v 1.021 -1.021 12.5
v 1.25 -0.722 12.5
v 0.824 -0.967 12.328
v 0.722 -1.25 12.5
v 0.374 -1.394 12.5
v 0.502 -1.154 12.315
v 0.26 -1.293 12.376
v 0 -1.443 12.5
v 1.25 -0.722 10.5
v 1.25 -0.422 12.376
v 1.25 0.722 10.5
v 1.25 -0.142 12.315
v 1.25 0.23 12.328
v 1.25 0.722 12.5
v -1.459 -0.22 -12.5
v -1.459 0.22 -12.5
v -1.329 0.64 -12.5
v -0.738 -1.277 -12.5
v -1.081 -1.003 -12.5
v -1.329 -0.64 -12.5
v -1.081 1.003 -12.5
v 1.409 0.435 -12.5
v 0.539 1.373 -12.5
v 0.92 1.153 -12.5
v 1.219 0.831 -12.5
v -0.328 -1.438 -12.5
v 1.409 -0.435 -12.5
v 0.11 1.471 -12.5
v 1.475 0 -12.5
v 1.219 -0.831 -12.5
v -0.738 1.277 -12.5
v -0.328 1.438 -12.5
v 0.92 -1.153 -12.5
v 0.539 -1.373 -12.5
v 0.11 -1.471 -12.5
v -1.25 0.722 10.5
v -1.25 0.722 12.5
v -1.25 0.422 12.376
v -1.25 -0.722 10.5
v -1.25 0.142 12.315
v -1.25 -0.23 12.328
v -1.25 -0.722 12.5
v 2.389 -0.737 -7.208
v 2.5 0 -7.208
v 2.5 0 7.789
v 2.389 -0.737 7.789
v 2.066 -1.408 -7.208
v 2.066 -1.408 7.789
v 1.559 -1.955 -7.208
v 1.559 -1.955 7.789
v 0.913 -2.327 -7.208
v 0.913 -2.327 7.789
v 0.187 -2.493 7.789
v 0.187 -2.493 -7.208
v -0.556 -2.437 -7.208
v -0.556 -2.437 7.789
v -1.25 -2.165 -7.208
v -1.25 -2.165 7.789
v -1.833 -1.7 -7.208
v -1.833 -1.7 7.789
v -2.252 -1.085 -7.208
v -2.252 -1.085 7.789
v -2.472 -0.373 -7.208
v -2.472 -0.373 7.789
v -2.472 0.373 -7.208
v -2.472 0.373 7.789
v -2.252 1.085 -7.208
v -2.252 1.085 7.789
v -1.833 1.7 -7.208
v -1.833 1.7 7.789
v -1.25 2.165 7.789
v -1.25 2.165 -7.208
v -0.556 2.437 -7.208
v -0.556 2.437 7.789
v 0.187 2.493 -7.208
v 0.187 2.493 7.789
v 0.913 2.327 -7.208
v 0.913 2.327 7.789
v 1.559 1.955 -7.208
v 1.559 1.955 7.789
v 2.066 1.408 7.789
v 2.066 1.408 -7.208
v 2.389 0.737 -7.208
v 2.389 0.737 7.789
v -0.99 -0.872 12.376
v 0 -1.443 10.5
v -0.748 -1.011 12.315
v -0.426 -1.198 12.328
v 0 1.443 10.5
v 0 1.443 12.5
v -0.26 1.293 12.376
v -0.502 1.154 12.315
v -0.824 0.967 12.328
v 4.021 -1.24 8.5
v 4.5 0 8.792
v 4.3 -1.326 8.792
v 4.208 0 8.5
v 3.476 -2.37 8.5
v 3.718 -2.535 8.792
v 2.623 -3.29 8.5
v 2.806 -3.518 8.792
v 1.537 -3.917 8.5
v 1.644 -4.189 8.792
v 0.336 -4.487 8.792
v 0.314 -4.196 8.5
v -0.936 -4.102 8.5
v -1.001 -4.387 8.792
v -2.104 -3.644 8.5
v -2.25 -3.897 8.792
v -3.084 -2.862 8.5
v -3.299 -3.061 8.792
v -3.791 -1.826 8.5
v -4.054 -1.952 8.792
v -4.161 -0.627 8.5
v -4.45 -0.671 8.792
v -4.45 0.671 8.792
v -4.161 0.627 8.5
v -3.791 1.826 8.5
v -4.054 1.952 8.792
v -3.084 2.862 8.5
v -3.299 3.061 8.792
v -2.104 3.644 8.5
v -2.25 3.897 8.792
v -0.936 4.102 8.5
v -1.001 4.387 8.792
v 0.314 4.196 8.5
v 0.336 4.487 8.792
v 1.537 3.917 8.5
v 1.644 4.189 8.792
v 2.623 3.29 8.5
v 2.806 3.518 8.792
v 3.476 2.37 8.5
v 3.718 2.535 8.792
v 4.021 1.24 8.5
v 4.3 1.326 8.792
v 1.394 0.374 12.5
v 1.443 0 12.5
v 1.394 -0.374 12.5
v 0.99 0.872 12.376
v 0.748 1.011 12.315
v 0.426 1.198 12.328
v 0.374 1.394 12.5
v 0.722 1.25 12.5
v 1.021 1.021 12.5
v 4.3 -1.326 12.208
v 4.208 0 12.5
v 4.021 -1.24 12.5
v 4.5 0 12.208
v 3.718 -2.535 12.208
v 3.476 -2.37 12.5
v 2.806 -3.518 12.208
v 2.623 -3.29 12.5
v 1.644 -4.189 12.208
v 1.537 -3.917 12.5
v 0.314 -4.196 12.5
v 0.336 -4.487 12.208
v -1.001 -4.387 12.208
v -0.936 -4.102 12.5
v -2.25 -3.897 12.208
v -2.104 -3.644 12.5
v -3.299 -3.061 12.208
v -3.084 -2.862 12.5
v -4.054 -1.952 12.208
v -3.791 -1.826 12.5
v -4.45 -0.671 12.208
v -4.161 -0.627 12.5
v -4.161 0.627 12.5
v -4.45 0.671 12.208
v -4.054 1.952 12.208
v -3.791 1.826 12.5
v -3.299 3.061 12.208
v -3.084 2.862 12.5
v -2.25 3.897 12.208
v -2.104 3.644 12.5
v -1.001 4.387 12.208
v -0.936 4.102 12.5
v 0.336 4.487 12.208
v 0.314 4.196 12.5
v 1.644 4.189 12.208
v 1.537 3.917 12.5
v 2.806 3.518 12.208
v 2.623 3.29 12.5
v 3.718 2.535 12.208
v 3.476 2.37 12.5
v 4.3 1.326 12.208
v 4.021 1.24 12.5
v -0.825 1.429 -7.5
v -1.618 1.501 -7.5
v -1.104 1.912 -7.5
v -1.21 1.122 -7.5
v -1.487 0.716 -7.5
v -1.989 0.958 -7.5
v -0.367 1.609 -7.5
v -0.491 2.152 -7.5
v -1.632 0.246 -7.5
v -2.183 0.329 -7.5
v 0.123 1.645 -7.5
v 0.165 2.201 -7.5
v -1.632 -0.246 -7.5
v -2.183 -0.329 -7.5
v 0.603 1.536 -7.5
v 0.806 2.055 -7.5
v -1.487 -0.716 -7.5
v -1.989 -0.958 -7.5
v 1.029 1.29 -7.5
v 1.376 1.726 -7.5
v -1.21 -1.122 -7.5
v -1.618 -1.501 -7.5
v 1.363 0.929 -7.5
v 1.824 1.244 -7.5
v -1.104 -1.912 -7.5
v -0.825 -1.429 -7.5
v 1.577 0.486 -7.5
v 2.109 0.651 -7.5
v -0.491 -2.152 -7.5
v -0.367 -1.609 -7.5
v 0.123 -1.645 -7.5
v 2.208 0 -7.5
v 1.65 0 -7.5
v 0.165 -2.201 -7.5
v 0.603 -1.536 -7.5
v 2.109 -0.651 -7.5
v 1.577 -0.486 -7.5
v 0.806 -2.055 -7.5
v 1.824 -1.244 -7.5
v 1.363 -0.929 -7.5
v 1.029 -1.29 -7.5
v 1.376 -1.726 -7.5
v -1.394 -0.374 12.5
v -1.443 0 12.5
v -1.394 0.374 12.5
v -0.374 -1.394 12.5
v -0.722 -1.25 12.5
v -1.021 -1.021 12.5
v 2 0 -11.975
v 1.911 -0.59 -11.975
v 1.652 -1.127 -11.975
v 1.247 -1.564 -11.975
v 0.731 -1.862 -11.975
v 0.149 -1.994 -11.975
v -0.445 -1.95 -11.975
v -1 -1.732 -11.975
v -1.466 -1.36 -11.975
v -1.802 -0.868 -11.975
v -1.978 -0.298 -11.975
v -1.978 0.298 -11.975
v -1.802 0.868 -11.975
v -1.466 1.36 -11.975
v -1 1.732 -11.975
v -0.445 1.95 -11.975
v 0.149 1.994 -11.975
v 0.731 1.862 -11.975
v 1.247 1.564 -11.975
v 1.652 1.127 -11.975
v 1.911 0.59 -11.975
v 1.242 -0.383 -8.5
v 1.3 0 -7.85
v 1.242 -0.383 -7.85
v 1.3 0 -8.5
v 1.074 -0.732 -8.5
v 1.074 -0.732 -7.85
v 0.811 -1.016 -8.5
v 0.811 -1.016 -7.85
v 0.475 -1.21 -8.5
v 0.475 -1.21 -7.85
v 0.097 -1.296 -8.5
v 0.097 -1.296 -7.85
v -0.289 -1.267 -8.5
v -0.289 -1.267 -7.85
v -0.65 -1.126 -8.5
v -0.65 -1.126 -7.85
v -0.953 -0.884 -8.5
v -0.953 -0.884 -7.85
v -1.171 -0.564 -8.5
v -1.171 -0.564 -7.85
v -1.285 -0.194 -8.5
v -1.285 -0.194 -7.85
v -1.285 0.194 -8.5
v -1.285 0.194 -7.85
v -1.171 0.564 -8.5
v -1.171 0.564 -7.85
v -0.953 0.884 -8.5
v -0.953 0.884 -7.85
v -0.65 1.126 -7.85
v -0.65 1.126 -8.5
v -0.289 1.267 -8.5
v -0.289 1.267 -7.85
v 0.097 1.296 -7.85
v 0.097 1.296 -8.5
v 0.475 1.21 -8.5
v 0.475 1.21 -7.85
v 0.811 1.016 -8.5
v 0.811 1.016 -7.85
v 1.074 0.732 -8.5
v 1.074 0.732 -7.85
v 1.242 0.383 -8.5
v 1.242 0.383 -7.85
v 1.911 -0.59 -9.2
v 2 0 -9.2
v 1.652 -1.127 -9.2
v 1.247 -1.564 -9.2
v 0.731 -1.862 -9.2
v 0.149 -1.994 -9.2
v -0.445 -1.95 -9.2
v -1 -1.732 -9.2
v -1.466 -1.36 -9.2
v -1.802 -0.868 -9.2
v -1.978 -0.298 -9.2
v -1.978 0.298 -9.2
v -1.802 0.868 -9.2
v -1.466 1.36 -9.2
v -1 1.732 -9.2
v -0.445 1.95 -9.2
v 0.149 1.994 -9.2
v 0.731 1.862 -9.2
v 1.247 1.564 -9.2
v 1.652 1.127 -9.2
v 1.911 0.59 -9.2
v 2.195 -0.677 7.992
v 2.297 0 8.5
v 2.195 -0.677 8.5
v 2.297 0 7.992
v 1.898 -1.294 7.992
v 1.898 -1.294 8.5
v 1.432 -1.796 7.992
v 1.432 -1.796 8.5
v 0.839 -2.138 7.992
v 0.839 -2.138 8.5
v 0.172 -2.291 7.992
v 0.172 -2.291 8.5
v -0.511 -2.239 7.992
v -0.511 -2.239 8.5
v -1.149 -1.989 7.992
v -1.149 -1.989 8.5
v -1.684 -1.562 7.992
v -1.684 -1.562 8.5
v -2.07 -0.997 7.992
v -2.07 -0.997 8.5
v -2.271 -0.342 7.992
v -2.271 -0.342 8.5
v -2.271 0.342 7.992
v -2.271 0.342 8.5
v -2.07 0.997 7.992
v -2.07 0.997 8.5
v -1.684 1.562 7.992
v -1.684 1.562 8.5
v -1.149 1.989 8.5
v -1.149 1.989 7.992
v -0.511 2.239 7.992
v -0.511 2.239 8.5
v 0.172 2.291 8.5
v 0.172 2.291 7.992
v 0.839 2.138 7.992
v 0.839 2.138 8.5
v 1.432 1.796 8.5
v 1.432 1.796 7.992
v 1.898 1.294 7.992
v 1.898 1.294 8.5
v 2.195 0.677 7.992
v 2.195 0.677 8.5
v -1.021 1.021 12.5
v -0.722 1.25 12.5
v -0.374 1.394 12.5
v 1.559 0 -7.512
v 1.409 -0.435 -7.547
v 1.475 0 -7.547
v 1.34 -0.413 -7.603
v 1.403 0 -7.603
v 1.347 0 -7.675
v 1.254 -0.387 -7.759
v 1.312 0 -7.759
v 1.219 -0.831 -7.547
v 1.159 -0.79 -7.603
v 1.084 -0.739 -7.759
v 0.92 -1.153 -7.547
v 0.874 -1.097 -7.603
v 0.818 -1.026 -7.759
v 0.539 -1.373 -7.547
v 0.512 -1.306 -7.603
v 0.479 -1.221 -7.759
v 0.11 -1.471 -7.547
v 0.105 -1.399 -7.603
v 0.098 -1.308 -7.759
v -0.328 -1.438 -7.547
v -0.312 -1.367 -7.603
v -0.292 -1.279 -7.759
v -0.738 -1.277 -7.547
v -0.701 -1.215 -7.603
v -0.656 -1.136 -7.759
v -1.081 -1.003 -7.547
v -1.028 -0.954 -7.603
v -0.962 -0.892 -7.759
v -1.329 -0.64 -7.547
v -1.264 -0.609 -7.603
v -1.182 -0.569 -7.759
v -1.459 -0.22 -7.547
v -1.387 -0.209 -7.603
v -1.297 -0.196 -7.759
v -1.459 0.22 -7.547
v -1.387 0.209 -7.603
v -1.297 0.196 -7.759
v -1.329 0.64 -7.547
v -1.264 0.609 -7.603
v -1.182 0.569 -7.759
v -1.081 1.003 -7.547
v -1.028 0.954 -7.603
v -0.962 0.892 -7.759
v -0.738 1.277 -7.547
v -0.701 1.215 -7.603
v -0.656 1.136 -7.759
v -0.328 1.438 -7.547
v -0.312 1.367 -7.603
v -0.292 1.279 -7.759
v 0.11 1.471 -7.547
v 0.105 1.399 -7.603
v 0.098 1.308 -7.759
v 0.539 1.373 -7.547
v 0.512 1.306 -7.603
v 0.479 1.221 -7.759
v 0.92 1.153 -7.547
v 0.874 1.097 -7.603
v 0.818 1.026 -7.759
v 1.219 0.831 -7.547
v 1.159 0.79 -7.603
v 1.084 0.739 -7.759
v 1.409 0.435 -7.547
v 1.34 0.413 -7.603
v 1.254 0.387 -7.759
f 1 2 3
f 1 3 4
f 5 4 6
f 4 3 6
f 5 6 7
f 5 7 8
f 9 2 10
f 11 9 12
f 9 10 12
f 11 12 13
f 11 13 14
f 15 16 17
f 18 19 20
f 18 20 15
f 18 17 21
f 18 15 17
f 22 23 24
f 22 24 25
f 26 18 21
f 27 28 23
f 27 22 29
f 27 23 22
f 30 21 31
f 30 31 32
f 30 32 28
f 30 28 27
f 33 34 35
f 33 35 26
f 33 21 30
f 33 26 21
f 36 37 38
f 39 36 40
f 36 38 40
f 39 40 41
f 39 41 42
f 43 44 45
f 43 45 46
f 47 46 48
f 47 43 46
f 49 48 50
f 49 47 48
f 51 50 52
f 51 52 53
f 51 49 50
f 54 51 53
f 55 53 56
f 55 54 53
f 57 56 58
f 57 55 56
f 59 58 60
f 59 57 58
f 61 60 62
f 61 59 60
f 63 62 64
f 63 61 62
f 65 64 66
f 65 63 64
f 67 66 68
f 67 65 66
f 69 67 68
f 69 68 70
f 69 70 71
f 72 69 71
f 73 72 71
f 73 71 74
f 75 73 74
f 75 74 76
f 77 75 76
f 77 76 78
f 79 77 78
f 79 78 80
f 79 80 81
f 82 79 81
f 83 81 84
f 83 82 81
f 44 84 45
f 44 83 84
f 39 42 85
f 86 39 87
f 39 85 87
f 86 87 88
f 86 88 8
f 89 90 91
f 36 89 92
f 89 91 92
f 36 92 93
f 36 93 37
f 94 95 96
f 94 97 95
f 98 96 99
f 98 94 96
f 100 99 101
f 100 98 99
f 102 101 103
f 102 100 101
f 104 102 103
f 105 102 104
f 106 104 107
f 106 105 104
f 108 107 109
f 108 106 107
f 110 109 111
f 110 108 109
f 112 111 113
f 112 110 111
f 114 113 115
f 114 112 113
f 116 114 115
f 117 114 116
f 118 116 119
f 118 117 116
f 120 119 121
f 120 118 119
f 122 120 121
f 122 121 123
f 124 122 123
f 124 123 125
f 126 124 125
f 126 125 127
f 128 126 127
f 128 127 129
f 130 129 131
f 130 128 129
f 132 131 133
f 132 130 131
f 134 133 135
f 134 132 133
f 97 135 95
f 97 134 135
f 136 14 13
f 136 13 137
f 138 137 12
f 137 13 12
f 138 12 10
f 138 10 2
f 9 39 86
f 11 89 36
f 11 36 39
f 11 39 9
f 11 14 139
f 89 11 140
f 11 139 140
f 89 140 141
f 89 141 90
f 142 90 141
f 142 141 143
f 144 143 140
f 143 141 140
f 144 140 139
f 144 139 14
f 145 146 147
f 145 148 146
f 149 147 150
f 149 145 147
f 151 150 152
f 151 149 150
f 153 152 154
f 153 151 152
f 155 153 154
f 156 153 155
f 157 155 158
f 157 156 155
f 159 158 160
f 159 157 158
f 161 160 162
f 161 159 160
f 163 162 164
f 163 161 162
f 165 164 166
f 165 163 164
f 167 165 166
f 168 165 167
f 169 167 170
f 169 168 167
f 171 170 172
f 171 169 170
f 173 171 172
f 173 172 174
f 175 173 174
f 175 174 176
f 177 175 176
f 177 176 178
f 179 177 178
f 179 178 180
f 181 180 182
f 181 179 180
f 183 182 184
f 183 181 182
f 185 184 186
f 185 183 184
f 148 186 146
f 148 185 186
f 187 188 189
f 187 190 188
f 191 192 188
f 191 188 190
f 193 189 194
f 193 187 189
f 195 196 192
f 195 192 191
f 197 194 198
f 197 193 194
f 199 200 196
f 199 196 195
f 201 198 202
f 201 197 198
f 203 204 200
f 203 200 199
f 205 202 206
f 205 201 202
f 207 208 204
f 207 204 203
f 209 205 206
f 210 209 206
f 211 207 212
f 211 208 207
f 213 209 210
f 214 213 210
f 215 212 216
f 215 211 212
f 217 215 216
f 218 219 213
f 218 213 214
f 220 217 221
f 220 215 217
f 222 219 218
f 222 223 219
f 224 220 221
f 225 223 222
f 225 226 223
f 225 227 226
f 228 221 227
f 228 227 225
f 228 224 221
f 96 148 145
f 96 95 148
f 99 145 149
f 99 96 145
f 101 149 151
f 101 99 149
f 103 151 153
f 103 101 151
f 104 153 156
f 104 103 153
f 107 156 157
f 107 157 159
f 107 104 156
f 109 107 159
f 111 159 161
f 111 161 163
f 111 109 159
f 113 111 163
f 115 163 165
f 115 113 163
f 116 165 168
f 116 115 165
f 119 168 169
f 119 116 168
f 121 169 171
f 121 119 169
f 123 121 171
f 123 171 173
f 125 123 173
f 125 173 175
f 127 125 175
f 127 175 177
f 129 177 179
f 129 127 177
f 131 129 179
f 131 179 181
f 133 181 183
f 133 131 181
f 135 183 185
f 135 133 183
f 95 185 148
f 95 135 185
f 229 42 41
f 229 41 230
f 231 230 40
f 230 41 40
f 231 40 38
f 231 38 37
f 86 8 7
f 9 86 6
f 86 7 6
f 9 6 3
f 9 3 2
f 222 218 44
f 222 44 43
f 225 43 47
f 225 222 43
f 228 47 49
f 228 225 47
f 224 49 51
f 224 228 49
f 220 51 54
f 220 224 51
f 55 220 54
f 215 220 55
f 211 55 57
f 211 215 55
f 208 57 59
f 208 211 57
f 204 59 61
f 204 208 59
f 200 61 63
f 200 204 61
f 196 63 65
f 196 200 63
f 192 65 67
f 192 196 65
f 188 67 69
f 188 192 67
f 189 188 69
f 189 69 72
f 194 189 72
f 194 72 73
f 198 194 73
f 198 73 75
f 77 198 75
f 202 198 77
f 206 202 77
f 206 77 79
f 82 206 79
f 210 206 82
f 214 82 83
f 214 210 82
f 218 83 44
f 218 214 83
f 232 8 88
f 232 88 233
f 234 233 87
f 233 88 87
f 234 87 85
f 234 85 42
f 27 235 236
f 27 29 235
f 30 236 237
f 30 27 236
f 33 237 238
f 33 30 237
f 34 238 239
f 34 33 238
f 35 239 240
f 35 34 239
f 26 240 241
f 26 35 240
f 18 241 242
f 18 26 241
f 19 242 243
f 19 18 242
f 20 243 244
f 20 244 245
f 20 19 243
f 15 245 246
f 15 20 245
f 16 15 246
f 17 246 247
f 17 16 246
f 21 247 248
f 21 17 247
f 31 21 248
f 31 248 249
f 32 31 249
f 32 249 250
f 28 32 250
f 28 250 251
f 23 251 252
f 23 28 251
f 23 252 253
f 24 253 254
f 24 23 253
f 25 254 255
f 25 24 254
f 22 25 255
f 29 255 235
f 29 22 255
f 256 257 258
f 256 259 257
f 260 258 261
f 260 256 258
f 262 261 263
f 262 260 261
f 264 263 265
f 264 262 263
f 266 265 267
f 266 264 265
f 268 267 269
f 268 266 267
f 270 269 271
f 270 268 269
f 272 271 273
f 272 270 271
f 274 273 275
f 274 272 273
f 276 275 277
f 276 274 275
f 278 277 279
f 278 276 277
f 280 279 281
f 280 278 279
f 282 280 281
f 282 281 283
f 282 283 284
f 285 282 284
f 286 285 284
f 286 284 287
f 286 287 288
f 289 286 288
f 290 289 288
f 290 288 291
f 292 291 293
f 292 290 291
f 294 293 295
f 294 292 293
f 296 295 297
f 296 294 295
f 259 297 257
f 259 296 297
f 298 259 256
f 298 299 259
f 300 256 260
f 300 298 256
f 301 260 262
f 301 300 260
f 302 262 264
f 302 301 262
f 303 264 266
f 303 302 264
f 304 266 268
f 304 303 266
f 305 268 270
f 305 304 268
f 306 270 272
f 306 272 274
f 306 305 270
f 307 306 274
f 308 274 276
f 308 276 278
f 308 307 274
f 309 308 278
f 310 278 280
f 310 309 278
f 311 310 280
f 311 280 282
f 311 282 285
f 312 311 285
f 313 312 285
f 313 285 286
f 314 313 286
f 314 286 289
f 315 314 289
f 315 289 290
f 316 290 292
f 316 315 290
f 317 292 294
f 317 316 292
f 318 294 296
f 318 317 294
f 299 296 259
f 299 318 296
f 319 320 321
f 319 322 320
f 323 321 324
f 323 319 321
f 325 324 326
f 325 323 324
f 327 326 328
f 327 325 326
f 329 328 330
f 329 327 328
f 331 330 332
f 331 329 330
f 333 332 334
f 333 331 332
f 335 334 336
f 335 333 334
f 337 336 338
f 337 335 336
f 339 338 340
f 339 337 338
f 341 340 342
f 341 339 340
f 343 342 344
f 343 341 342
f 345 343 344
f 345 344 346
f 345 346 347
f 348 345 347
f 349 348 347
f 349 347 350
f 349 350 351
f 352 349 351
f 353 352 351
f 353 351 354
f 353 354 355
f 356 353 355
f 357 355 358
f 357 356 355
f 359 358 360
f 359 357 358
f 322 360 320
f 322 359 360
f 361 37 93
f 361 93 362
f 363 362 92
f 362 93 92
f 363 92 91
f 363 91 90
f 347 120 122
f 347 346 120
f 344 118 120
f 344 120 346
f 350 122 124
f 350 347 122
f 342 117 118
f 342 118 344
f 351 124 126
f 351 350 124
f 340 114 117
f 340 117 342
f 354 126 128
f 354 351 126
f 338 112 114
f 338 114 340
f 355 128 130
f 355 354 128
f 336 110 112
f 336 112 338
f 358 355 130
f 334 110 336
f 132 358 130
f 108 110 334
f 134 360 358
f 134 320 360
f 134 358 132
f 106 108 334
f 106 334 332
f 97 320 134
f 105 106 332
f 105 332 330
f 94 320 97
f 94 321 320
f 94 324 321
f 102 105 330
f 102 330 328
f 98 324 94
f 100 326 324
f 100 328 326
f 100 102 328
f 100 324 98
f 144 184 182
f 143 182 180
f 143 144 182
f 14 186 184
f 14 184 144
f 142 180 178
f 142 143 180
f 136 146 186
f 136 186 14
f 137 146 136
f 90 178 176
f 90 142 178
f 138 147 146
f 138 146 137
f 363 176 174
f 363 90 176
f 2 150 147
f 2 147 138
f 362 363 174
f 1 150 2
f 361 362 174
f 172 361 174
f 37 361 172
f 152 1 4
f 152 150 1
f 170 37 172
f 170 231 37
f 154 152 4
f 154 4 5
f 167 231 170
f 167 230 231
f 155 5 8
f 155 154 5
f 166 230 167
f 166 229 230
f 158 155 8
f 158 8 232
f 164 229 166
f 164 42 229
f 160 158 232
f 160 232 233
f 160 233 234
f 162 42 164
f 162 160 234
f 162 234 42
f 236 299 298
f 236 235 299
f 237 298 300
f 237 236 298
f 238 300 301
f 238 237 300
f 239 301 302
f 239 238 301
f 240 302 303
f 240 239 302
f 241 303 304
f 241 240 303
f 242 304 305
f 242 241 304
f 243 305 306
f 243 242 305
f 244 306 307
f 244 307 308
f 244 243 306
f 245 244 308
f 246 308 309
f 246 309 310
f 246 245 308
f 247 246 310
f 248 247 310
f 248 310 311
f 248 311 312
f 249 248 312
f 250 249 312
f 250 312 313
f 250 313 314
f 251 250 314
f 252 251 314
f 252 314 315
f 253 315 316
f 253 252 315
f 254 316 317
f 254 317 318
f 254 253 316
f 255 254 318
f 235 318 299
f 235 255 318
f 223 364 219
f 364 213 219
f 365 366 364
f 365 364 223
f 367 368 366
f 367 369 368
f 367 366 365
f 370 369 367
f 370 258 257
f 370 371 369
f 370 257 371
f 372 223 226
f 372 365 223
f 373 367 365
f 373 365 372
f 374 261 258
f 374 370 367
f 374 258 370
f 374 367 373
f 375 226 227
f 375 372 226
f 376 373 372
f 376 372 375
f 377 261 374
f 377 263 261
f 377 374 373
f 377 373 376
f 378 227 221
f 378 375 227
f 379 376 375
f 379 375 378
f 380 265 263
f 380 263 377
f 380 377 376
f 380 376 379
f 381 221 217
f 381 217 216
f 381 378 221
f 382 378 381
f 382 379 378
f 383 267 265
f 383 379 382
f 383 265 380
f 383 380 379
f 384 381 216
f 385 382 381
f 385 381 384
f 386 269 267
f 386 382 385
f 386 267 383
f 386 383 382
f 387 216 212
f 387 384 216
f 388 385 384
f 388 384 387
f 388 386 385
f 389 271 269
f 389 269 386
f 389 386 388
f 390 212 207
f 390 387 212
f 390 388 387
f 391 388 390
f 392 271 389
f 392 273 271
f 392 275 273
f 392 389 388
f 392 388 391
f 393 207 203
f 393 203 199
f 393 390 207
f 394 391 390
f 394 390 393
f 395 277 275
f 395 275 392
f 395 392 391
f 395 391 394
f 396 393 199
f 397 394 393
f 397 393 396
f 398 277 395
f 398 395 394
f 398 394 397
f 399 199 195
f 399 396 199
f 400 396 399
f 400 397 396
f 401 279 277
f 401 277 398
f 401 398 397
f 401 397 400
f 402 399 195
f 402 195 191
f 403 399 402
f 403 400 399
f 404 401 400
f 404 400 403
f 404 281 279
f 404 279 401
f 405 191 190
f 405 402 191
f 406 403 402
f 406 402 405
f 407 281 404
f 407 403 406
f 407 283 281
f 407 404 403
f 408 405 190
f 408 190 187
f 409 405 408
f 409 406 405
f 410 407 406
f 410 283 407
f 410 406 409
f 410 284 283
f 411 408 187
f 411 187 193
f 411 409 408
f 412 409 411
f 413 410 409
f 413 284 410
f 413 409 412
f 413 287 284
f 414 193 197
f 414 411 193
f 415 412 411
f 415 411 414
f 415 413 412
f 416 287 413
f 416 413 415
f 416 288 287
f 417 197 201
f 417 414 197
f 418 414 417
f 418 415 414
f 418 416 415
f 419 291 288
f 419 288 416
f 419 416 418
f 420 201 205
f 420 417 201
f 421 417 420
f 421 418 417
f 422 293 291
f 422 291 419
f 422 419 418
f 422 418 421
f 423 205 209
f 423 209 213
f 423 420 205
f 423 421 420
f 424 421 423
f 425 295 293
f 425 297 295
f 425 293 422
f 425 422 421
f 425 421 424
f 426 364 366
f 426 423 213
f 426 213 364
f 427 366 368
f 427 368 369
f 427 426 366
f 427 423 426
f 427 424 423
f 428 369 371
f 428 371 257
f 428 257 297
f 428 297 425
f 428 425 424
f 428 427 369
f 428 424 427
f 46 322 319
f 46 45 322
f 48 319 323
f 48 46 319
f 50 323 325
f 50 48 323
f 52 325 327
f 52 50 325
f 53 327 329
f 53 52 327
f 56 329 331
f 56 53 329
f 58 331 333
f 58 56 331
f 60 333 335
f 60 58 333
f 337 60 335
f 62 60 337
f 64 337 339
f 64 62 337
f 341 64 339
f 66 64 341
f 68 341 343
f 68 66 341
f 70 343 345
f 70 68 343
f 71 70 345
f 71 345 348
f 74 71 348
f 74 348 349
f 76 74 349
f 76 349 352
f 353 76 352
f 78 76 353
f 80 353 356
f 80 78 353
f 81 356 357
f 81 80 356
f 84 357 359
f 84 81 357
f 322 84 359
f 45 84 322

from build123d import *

# Parameters (mm, degrees)
CUT_EXTRUDE1_START = 12.5
CUT_EXTRUDE1_DEPTH = 2
CHAMFER1_SIZE      = 0.2925


with BuildPart() as part:
    # Sketch3 → Revolve1 (revolve)
    with BuildSketch(Plane(origin=(0, 0, 0), x_dir=(0, 0, -1), z_dir=(1, 0, 0)), mode=Mode.PRIVATE) as revolve1_sk:
        with BuildLine():
            Line((-12.5, 0), (-12.5, 4.2075))
            Line((-12.5, 4.2075), (-12.2075, 4.5))
            Line((-12.2075, 4.5), (-8.7925, 4.5))
            Line((-8.7925, 4.5), (-8.5, 4.2075))
            Line((-8.5, 4.2075), (-8.5, 2.297))
            Line((-8.5, 2.297), (-7.992, 2.297))
            Line((-7.992, 2.297), (-7.789, 2.5))
            Line((-7.789, 2.5), (7.5, 2.5))
            Line((7.5, 2.5), (7.5, 1.65))
            ThreePointArc((7.5, 1.65), (7.602512627, 1.402512627), (7.85, 1.3))
            Line((7.85, 1.3), (8.5, 1.3))
            Line((8.5, 1.3), (9.2, 2))
            Line((9.2, 2), (11.975, 2))
            Line((11.975, 2), (12.5, 1.475))
            Line((12.5, 1.475), (12.5, 0))
            Line((12.5, 0), (-12.5, 0))
        make_face()
    revolve(revolve1_sk.sketch.rotate(Axis((0, 0, 12.5), (0, 0, -1)), 90), axis=Axis((0, 0, 12.5), (0, 0, -1)))

    # Sketch4 → Cut-Extrude1 (cut)
    with BuildSketch(Plane.XY.offset(CUT_EXTRUDE1_START)):
        Polygon((0, 1.443375673), (-1.25, 0.721687836), (-1.25, -0.721687836), (0, -1.443375673), (1.25, -0.721687836), (1.25, 0.721687836), align=None)
    extrude(amount=-CUT_EXTRUDE1_DEPTH, mode=Mode.SUBTRACT)

    # Cut-Extrude2 cone 1 section (through the dimple's axis) → Cut-Extrude2 (revolve, cut)
    with BuildSketch(Plane(origin=(0, 0, 12.5), x_dir=(0, -1, 0), z_dir=(1, 0, 0))):
        Polygon((0, 0), (1.443375673, 0), (0, 1.443375673), align=None)
    revolve(axis=Axis((0, 0, 12.5), (0, 0, -1)), mode=Mode.SUBTRACT)

    # Chamfer1
    chamfer1_edges = [part.edges().sort_by_distance(p)[0] for p in [
        (-2.5, 0, -7.5),
    ]]
    chamfer(chamfer1_edges, length=CHAMFER1_SIZE)


solid = part.part
